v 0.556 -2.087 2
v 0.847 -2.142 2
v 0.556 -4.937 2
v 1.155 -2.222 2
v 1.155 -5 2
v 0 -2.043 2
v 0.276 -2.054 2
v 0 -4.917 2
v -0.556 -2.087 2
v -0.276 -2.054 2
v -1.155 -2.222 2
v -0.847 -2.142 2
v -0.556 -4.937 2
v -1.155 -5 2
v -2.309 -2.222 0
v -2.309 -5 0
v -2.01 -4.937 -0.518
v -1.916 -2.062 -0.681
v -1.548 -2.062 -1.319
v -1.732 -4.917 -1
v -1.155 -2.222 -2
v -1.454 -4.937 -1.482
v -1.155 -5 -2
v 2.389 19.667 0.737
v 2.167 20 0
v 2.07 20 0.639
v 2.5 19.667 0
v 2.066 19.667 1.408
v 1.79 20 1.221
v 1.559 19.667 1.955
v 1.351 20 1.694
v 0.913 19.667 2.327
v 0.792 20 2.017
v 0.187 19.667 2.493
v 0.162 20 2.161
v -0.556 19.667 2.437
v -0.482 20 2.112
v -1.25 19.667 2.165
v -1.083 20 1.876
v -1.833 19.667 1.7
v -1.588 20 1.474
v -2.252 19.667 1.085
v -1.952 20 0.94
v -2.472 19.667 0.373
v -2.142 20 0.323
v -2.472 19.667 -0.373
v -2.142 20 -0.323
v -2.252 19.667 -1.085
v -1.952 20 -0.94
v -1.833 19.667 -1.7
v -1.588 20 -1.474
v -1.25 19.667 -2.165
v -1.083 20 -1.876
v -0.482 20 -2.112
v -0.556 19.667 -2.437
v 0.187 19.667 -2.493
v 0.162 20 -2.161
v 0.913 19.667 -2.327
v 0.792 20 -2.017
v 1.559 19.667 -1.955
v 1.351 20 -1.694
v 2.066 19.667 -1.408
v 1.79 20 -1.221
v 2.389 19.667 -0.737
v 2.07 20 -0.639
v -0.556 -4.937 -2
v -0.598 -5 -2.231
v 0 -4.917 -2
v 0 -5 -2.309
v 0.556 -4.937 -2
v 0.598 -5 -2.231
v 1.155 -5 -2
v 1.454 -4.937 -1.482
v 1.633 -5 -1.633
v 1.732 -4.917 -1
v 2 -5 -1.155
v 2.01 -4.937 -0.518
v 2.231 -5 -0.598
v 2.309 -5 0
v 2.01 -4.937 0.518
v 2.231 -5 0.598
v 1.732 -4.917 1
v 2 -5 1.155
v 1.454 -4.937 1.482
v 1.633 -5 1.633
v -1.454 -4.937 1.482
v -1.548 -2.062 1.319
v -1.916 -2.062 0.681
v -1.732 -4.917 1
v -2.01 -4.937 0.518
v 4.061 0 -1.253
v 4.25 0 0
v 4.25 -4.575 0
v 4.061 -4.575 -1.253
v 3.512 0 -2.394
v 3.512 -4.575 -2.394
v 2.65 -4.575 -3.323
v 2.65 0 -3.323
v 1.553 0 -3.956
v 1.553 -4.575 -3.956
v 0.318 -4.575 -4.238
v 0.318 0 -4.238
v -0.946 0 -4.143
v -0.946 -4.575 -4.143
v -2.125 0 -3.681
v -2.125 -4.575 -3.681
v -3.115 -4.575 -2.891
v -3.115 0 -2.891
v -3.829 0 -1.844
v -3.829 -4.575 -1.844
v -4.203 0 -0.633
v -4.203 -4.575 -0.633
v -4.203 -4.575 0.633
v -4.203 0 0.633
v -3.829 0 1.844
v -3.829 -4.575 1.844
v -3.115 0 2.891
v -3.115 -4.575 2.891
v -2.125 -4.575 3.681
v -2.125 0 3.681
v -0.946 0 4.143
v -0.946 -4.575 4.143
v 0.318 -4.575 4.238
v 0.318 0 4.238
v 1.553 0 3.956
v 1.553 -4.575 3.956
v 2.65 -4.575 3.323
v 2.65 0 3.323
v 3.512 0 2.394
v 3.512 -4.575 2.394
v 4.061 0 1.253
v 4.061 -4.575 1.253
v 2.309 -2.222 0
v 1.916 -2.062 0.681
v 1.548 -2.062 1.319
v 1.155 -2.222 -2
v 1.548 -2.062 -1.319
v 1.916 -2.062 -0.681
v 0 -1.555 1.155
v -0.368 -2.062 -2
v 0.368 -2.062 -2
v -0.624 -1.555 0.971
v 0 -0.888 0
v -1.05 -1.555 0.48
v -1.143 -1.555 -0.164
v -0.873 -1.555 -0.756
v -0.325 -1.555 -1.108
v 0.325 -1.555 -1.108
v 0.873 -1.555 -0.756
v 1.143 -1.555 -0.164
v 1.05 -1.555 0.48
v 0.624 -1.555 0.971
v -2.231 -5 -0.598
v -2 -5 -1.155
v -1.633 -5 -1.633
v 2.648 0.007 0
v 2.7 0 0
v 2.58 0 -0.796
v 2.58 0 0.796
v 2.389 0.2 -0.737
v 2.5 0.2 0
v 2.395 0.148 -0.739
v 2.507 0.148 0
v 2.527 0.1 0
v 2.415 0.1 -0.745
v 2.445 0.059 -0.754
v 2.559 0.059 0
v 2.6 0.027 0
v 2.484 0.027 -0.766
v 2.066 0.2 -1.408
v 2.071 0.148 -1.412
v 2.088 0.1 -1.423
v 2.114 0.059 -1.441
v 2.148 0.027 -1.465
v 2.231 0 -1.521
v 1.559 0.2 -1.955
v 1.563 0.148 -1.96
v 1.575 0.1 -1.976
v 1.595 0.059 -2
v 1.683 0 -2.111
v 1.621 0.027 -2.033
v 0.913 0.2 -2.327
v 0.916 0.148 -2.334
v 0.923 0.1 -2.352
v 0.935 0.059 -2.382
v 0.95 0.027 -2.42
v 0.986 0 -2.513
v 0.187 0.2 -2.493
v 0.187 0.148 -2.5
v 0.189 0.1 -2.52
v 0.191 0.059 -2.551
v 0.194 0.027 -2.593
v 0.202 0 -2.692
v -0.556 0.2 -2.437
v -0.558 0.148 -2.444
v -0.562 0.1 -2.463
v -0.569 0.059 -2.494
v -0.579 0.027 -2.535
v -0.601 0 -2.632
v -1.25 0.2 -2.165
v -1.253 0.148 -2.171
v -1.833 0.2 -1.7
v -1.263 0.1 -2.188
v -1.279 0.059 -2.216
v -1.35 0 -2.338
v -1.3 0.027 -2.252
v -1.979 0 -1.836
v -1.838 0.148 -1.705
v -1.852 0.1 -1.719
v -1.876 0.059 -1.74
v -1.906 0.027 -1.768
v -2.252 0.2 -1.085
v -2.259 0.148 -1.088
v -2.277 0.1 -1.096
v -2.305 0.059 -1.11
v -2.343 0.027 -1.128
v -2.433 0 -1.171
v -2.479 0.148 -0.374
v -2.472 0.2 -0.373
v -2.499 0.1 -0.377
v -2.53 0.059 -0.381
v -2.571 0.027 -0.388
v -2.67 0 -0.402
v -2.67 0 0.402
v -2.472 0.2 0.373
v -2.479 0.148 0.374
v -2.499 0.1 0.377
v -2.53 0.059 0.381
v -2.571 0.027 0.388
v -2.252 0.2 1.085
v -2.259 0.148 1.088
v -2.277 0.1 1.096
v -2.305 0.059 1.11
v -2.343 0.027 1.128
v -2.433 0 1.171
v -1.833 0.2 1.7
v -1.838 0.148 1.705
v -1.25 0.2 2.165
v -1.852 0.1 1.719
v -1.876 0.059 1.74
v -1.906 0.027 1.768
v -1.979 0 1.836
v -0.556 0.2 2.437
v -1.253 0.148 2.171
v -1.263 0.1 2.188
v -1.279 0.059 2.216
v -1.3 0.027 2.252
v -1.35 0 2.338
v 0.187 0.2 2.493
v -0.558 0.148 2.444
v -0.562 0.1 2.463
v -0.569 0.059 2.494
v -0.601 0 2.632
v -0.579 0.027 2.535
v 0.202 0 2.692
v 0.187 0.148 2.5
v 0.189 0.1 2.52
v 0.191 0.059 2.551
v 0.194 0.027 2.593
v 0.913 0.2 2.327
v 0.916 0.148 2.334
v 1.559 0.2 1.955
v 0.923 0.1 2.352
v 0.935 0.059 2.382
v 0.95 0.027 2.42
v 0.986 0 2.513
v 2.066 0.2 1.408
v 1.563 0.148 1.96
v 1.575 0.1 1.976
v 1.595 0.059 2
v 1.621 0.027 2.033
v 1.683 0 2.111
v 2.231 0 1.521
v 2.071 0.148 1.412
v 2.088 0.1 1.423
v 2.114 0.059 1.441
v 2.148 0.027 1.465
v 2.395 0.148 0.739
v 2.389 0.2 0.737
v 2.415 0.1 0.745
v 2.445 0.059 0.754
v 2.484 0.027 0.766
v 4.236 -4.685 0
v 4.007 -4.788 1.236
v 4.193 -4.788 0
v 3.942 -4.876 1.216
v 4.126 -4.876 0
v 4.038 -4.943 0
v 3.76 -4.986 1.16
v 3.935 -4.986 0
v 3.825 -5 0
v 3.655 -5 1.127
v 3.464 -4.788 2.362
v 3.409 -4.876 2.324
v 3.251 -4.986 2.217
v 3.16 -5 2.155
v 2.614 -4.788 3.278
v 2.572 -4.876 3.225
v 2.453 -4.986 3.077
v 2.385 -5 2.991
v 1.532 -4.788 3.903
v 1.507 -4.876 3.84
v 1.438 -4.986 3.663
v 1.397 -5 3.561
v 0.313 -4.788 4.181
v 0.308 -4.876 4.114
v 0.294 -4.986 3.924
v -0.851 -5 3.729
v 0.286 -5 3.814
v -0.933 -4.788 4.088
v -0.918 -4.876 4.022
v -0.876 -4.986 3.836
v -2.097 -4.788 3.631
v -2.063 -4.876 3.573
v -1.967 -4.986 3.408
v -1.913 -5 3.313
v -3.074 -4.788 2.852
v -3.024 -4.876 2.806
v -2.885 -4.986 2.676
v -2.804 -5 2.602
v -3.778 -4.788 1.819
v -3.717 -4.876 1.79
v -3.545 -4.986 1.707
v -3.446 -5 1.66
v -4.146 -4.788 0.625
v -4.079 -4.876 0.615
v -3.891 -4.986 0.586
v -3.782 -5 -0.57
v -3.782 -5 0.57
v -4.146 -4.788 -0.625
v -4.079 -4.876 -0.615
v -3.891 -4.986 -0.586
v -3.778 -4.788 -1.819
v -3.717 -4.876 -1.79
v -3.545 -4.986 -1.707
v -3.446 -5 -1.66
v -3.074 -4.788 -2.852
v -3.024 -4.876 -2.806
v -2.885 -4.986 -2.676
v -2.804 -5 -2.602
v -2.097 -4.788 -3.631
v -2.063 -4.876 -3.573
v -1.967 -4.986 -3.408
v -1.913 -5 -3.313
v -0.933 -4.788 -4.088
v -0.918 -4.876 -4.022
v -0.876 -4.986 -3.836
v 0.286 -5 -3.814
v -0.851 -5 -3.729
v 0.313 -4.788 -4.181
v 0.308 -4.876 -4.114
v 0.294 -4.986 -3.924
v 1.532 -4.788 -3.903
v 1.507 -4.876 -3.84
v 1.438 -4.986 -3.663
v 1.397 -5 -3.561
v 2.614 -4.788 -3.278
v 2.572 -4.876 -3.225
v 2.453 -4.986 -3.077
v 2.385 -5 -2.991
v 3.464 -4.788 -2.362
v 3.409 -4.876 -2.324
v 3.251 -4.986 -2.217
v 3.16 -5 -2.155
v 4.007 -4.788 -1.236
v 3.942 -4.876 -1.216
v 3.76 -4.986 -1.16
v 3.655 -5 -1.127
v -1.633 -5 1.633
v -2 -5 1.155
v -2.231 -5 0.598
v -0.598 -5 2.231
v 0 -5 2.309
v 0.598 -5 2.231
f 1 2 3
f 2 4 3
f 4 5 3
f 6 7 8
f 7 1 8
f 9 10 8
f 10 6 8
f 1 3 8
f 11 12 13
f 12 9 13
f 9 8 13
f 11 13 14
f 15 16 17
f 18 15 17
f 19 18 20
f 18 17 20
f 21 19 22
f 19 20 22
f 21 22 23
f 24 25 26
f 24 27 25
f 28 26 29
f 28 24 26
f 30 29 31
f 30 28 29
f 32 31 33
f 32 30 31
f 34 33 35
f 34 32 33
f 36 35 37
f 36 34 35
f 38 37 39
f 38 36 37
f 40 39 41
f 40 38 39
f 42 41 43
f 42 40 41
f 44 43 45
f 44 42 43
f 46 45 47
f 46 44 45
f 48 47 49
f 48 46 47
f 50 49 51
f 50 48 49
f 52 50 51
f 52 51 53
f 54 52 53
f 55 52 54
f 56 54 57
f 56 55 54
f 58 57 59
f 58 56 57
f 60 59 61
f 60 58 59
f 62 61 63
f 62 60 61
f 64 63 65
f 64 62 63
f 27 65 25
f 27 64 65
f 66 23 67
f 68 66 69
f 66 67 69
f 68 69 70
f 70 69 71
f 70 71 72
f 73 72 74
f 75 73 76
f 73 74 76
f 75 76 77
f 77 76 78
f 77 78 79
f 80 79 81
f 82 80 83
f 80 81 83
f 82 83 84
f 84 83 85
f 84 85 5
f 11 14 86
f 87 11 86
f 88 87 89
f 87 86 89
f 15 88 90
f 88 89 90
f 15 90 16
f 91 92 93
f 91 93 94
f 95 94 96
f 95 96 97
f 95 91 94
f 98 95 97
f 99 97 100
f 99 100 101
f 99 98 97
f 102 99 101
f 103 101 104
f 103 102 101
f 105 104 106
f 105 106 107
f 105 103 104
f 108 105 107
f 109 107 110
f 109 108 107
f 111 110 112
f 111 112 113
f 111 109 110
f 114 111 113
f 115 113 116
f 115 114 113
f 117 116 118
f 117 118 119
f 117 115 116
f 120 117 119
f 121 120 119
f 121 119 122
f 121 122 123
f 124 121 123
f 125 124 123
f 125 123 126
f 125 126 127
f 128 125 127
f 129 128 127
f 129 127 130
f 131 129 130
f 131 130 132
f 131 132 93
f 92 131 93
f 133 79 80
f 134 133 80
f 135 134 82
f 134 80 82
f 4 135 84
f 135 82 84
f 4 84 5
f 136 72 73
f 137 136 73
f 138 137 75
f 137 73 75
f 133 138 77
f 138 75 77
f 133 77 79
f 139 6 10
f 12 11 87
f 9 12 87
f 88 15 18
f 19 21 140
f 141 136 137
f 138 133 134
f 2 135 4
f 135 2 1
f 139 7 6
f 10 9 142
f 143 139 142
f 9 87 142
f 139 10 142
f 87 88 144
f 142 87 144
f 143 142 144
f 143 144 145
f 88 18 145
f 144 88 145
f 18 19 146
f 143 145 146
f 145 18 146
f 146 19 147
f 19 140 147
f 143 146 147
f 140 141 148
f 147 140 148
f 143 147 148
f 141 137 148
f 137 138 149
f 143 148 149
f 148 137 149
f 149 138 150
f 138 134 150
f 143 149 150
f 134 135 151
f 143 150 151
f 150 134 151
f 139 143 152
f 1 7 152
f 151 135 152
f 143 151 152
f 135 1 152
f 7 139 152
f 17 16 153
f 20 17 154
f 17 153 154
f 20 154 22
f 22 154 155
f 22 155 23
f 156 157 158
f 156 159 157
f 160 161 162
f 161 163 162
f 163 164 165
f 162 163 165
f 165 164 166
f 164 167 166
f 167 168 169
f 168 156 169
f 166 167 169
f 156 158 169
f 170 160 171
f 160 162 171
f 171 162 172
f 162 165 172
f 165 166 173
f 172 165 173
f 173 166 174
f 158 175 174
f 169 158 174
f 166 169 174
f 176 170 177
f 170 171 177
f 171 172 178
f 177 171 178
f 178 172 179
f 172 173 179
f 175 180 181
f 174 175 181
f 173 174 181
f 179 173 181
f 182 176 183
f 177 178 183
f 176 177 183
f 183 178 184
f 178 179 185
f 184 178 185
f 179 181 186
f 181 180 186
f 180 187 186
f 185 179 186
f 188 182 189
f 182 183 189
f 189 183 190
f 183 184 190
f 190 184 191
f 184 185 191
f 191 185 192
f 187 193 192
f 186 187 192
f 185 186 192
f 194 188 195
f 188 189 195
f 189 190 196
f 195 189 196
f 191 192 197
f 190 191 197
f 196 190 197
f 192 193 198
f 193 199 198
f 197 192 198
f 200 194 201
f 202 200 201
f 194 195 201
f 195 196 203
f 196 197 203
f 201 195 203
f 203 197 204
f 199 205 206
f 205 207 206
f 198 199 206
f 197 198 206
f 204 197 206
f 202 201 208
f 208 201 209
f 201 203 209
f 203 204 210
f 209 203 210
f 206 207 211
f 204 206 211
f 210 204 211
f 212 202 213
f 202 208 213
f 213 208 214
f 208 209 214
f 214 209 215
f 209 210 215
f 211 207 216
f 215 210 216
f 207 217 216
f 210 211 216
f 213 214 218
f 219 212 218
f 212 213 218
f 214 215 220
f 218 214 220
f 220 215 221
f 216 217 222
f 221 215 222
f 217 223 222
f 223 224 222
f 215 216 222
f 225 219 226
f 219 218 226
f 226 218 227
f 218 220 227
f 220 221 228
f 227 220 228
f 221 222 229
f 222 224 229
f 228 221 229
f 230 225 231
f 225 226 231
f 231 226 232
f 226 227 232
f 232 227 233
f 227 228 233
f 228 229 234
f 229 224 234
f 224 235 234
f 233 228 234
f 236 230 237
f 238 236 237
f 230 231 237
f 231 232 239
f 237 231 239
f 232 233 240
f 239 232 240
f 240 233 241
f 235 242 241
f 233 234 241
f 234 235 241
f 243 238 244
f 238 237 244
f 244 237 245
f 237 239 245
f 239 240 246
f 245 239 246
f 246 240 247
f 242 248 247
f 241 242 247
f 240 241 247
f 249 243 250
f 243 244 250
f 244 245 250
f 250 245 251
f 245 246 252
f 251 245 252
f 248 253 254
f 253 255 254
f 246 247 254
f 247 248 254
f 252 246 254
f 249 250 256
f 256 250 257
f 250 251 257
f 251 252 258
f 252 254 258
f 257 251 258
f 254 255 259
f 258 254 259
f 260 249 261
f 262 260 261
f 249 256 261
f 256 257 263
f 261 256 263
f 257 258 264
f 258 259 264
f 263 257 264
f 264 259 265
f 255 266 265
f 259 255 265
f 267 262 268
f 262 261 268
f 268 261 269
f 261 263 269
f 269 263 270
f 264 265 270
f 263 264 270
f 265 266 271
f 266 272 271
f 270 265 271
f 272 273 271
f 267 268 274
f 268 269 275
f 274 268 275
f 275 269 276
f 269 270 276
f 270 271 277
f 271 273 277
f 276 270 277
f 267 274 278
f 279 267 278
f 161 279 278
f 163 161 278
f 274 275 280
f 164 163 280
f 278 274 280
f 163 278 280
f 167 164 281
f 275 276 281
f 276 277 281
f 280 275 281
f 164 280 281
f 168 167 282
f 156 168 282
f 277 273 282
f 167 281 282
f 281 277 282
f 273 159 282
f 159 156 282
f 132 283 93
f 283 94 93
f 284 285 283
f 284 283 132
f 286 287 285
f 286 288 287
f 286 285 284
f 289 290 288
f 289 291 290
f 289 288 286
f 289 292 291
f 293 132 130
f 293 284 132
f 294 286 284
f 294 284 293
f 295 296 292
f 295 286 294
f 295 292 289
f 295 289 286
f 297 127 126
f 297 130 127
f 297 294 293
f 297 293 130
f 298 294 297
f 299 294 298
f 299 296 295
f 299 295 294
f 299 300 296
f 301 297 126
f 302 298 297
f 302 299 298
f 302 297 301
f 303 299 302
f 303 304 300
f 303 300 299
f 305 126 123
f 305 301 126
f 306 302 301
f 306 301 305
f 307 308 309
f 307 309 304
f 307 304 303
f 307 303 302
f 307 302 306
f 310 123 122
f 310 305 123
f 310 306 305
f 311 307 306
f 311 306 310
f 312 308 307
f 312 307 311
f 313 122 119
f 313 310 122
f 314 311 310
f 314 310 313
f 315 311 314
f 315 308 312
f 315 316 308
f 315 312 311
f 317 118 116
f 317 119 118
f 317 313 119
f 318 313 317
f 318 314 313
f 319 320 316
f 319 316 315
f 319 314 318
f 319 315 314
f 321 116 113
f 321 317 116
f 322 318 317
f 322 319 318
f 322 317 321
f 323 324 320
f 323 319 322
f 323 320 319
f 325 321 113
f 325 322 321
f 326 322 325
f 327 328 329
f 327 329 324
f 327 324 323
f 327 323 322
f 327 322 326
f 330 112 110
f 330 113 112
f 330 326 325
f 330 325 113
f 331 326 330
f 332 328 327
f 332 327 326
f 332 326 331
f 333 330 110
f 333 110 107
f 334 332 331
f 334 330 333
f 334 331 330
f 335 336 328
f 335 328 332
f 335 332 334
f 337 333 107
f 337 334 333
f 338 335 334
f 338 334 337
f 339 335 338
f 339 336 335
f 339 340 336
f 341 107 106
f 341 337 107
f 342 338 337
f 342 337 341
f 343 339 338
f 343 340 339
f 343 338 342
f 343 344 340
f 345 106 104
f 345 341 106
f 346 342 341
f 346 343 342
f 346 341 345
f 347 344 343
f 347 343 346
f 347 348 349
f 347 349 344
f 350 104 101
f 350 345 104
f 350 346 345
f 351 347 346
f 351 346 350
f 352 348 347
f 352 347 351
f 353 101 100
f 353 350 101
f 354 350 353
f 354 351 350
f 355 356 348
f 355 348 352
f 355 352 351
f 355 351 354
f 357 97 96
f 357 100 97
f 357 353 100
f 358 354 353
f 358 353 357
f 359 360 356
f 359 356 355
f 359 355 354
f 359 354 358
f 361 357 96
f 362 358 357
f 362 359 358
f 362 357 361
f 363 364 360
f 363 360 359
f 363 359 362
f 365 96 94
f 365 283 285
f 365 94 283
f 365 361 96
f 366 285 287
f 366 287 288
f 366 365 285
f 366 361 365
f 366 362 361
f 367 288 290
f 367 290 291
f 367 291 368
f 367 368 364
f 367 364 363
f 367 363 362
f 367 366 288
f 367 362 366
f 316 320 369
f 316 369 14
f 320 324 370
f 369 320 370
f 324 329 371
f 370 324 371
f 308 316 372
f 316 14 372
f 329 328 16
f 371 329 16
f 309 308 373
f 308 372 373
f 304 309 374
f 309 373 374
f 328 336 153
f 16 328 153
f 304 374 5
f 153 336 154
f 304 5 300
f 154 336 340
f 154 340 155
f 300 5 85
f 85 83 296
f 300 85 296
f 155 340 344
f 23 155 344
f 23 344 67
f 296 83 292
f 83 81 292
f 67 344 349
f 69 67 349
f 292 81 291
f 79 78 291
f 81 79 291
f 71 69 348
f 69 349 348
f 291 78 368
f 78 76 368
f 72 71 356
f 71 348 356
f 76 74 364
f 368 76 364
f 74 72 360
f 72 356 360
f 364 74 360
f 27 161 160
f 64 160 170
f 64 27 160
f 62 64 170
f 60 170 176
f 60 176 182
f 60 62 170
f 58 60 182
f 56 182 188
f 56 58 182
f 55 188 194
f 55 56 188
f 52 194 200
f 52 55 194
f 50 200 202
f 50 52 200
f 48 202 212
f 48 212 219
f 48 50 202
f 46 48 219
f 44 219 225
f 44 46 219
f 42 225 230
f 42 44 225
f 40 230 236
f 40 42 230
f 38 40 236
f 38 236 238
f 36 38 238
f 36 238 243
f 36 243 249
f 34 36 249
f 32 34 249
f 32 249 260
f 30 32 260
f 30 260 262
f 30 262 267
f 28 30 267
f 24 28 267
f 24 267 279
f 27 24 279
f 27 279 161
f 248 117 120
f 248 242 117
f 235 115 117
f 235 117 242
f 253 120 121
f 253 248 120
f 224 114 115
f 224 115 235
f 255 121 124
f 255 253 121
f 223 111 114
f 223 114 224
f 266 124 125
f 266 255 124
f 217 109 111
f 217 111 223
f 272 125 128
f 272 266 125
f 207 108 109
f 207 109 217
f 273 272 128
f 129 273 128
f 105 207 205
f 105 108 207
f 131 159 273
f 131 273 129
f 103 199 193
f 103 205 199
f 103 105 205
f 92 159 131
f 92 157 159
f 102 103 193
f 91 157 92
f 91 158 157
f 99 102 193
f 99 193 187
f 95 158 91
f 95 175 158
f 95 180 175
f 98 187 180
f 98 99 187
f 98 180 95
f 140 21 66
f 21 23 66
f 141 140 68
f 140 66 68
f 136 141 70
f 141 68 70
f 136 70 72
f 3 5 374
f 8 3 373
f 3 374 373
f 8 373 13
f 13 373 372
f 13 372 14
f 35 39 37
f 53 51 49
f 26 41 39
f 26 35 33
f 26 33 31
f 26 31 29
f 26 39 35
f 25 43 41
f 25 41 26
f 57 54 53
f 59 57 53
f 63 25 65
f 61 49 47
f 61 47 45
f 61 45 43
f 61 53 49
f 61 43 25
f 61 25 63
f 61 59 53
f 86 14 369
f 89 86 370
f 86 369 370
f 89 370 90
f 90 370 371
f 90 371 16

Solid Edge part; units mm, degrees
sketch "Sketch1" plane through (0, 0, 0) normal (0, 0, 1) x (1, 0, 0)
  line L0 (2.5, 0) -> (2.5, 20)
  line L1 (0, 20) -> (2.5, 20)
  line L2 (0, 0) -> (0, 20)
  line L3 (0, 0) -> (0, -5)
  line L4 (0, -5) -> (4.25, -5)
  line L5 (4.25, -5) -> (4.25, 0)
  line L6 (4.25, 0) -> (2.5, 0)
revolve "RevolvedProtrusion1" add sketch "Sketch1" angle 360 about axis through (0, 0, 0) along (0, 1, 0)
sketch "Sketch2" plane through (0, 0, 0) normal (1, 0, 0) x (0, 1, 0)
  line L0 (-5, 2.7915) -> (-2.5, 2.7915)
  line L1 (-0.8883, 0) -> (-2.5, 2.7915)
  line L2 (-5, 0) -> (-0.8883, 0)
  line L3 (-5, 0) -> (-5, 2.7915)
revolve "RevolvedCutout1" cut sketch "Sketch2" angle 360 about axis through (0, -4.5, 0) along (0, 1, 0)
sketch "Sketch3" plane through (0, -5, 0) normal (0, -1, 0) x (0, 0, 1)
  circle A0 centre (0, 0) radius 2.7915
  line L0 (-2, -1.1547) -> (0, -2.3094)
  line L1 (0, -2.3094) -> (2, -1.1547)
  line L2 (2, -1.1547) -> (2, 1.1547)
  line L3 (2, 1.1547) -> (0, 2.3094)
  line L4 (0, 2.3094) -> (-2, 1.1547)
  line L5 (-2, 1.1547) -> (-2, -1.1547)
  dimension "D1" = 4
extrude "Protrusion1" add sketch "Sketch3" against normal up to next
sketch "Sketch4" plane through (0, 0, 0) normal (0, 0, 1) x (1, 0, 0)
  line L0 (-2.3094, -5) -> (0, -5)
  line L1 (0, -5) -> (0, -4.3812)
  line L2 (0, -4.3812) -> (-2.3094, -5)
revolve "RevolvedCutout2" cut sketch "Sketch4" angle 360 about axis through (0, -4.5, 0) along (0, 1, 0)
fillet "Round1" radius 0.2 1 edges at (0, 0, -2.5)
fillet "Round2" radius 0.425 1 edges at (0, -5, -4.25)
chamfer "倒斜角_2" distance 0.3333 angle 45 1 edges at (0, 20, -2.5)
cosmetic_thread "螺纹_3" size "M5" thread depth 16
